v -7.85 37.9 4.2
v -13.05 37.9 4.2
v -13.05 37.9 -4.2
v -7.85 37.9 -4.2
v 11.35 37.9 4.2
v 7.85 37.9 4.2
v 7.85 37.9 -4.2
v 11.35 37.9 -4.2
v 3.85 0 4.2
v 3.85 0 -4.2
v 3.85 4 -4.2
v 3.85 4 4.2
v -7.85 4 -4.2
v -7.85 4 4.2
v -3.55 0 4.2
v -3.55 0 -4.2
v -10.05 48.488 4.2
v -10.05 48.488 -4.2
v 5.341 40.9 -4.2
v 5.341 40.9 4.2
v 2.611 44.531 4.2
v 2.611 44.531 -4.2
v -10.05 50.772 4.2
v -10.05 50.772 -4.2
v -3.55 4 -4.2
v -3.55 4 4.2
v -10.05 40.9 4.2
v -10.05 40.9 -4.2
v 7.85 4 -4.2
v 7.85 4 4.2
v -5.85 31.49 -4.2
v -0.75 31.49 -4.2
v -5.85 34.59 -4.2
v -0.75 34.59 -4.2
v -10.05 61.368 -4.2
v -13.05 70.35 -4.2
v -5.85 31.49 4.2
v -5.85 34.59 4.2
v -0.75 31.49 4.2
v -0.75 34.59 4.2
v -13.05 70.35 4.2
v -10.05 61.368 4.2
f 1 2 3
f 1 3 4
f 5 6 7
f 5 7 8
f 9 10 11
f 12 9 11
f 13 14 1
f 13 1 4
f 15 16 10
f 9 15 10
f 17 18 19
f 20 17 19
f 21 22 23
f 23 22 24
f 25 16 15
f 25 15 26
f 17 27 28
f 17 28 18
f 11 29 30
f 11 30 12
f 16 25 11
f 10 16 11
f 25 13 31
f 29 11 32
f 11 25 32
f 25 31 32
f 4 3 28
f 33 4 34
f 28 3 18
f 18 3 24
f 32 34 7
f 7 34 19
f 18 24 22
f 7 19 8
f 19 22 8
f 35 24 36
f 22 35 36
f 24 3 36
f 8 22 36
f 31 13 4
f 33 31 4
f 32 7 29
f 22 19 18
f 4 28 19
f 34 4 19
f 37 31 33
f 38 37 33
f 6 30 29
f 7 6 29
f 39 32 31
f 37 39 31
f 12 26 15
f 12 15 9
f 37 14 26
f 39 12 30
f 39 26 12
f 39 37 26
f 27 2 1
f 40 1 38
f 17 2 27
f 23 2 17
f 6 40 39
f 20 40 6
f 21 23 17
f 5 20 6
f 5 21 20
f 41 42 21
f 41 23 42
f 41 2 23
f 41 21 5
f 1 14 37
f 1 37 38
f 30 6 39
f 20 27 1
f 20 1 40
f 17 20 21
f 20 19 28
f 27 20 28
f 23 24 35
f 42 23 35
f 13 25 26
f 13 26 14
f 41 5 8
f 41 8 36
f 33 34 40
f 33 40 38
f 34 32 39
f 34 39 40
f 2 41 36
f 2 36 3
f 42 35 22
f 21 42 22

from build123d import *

# Parameters (mm, degrees)
SKETCH_1_W          = 15.7
SKETCH_1_H          = 8.4
EXTRUDE_1_DEPTH     = 37.9
EXTRUDE_2_DEPTH     = 8.4
CUT_EXTRUDE_1_DEPTH = 73.041550511
SKETCH_4_W          = 4.3
SKETCH_4_H          = 4
SKETCH_4_W_2        = 4
CUT_EXTRUDE_2_DEPTH = 73.041550511
SKETCH_5_W          = 5.1
SKETCH_5_H          = 3.1
CUT_EXTRUDE_3_DEPTH = 73.041550511


with BuildPart() as part:
    # ｽｹｯﾁ1 → ﾎﾞｽ - 押し出し1 (new body)
    with BuildSketch(Plane(origin=(0, 0, 0), x_dir=(1, 0, 0), z_dir=(0, 1, 0))):
        Rectangle(SKETCH_1_W, SKETCH_1_H)
    extrude(amount=EXTRUDE_1_DEPTH)

    # ｽｹｯﾁ2 → ﾎﾞｽ - 押し出し2 (add)
    with BuildSketch(Plane.XY.offset(4.2)):
        Polygon((-13.05, 37.9), (11.35, 37.9), (-13.05, 70.35), align=None)
    extrude(amount=-EXTRUDE_2_DEPTH)

    # ｽｹｯﾁ3 → ｶｯﾄ - 押し出し1 (cut, through all)
    with BuildSketch(Plane(origin=(0, 0, -4.2), x_dir=(-1, 0, 0), z_dir=(0, 0, -1))):
        Polygon((10.05, 61.368438838), (-2.610871129, 44.530518012), (10.05, 50.772247606), align=None)
        Polygon((-5.340752161, 40.9), (10.05, 40.9), (10.05, 48.487543721), align=None)
    extrude(amount=-CUT_EXTRUDE_1_DEPTH, mode=Mode.SUBTRACT)

    # ｽｹｯﾁ4 → ｶｯﾄ - 押し出し2 (cut, through all)
    with BuildSketch(Plane(origin=(0, 0, -4.2), x_dir=(-1, 0, 0), z_dir=(0, 0, -1))):
        with Locations((5.7, 2)):
            Rectangle(SKETCH_4_W, SKETCH_4_H)
        with Locations((-5.85, 2)):
            Rectangle(SKETCH_4_W_2, SKETCH_4_H)
    extrude(amount=-CUT_EXTRUDE_2_DEPTH, mode=Mode.SUBTRACT)

    # ｽｹｯﾁ5 → ｶｯﾄ - 押し出し3 (cut, through all)
    with BuildSketch(Plane(origin=(0, 0, -4.2), x_dir=(-1, 0, 0), z_dir=(0, 0, -1))):
        with Locations((3.3, 33.04)):
            Rectangle(SKETCH_5_W, SKETCH_5_H)
    extrude(amount=-CUT_EXTRUDE_3_DEPTH, mode=Mode.SUBTRACT)


solid = part.part
